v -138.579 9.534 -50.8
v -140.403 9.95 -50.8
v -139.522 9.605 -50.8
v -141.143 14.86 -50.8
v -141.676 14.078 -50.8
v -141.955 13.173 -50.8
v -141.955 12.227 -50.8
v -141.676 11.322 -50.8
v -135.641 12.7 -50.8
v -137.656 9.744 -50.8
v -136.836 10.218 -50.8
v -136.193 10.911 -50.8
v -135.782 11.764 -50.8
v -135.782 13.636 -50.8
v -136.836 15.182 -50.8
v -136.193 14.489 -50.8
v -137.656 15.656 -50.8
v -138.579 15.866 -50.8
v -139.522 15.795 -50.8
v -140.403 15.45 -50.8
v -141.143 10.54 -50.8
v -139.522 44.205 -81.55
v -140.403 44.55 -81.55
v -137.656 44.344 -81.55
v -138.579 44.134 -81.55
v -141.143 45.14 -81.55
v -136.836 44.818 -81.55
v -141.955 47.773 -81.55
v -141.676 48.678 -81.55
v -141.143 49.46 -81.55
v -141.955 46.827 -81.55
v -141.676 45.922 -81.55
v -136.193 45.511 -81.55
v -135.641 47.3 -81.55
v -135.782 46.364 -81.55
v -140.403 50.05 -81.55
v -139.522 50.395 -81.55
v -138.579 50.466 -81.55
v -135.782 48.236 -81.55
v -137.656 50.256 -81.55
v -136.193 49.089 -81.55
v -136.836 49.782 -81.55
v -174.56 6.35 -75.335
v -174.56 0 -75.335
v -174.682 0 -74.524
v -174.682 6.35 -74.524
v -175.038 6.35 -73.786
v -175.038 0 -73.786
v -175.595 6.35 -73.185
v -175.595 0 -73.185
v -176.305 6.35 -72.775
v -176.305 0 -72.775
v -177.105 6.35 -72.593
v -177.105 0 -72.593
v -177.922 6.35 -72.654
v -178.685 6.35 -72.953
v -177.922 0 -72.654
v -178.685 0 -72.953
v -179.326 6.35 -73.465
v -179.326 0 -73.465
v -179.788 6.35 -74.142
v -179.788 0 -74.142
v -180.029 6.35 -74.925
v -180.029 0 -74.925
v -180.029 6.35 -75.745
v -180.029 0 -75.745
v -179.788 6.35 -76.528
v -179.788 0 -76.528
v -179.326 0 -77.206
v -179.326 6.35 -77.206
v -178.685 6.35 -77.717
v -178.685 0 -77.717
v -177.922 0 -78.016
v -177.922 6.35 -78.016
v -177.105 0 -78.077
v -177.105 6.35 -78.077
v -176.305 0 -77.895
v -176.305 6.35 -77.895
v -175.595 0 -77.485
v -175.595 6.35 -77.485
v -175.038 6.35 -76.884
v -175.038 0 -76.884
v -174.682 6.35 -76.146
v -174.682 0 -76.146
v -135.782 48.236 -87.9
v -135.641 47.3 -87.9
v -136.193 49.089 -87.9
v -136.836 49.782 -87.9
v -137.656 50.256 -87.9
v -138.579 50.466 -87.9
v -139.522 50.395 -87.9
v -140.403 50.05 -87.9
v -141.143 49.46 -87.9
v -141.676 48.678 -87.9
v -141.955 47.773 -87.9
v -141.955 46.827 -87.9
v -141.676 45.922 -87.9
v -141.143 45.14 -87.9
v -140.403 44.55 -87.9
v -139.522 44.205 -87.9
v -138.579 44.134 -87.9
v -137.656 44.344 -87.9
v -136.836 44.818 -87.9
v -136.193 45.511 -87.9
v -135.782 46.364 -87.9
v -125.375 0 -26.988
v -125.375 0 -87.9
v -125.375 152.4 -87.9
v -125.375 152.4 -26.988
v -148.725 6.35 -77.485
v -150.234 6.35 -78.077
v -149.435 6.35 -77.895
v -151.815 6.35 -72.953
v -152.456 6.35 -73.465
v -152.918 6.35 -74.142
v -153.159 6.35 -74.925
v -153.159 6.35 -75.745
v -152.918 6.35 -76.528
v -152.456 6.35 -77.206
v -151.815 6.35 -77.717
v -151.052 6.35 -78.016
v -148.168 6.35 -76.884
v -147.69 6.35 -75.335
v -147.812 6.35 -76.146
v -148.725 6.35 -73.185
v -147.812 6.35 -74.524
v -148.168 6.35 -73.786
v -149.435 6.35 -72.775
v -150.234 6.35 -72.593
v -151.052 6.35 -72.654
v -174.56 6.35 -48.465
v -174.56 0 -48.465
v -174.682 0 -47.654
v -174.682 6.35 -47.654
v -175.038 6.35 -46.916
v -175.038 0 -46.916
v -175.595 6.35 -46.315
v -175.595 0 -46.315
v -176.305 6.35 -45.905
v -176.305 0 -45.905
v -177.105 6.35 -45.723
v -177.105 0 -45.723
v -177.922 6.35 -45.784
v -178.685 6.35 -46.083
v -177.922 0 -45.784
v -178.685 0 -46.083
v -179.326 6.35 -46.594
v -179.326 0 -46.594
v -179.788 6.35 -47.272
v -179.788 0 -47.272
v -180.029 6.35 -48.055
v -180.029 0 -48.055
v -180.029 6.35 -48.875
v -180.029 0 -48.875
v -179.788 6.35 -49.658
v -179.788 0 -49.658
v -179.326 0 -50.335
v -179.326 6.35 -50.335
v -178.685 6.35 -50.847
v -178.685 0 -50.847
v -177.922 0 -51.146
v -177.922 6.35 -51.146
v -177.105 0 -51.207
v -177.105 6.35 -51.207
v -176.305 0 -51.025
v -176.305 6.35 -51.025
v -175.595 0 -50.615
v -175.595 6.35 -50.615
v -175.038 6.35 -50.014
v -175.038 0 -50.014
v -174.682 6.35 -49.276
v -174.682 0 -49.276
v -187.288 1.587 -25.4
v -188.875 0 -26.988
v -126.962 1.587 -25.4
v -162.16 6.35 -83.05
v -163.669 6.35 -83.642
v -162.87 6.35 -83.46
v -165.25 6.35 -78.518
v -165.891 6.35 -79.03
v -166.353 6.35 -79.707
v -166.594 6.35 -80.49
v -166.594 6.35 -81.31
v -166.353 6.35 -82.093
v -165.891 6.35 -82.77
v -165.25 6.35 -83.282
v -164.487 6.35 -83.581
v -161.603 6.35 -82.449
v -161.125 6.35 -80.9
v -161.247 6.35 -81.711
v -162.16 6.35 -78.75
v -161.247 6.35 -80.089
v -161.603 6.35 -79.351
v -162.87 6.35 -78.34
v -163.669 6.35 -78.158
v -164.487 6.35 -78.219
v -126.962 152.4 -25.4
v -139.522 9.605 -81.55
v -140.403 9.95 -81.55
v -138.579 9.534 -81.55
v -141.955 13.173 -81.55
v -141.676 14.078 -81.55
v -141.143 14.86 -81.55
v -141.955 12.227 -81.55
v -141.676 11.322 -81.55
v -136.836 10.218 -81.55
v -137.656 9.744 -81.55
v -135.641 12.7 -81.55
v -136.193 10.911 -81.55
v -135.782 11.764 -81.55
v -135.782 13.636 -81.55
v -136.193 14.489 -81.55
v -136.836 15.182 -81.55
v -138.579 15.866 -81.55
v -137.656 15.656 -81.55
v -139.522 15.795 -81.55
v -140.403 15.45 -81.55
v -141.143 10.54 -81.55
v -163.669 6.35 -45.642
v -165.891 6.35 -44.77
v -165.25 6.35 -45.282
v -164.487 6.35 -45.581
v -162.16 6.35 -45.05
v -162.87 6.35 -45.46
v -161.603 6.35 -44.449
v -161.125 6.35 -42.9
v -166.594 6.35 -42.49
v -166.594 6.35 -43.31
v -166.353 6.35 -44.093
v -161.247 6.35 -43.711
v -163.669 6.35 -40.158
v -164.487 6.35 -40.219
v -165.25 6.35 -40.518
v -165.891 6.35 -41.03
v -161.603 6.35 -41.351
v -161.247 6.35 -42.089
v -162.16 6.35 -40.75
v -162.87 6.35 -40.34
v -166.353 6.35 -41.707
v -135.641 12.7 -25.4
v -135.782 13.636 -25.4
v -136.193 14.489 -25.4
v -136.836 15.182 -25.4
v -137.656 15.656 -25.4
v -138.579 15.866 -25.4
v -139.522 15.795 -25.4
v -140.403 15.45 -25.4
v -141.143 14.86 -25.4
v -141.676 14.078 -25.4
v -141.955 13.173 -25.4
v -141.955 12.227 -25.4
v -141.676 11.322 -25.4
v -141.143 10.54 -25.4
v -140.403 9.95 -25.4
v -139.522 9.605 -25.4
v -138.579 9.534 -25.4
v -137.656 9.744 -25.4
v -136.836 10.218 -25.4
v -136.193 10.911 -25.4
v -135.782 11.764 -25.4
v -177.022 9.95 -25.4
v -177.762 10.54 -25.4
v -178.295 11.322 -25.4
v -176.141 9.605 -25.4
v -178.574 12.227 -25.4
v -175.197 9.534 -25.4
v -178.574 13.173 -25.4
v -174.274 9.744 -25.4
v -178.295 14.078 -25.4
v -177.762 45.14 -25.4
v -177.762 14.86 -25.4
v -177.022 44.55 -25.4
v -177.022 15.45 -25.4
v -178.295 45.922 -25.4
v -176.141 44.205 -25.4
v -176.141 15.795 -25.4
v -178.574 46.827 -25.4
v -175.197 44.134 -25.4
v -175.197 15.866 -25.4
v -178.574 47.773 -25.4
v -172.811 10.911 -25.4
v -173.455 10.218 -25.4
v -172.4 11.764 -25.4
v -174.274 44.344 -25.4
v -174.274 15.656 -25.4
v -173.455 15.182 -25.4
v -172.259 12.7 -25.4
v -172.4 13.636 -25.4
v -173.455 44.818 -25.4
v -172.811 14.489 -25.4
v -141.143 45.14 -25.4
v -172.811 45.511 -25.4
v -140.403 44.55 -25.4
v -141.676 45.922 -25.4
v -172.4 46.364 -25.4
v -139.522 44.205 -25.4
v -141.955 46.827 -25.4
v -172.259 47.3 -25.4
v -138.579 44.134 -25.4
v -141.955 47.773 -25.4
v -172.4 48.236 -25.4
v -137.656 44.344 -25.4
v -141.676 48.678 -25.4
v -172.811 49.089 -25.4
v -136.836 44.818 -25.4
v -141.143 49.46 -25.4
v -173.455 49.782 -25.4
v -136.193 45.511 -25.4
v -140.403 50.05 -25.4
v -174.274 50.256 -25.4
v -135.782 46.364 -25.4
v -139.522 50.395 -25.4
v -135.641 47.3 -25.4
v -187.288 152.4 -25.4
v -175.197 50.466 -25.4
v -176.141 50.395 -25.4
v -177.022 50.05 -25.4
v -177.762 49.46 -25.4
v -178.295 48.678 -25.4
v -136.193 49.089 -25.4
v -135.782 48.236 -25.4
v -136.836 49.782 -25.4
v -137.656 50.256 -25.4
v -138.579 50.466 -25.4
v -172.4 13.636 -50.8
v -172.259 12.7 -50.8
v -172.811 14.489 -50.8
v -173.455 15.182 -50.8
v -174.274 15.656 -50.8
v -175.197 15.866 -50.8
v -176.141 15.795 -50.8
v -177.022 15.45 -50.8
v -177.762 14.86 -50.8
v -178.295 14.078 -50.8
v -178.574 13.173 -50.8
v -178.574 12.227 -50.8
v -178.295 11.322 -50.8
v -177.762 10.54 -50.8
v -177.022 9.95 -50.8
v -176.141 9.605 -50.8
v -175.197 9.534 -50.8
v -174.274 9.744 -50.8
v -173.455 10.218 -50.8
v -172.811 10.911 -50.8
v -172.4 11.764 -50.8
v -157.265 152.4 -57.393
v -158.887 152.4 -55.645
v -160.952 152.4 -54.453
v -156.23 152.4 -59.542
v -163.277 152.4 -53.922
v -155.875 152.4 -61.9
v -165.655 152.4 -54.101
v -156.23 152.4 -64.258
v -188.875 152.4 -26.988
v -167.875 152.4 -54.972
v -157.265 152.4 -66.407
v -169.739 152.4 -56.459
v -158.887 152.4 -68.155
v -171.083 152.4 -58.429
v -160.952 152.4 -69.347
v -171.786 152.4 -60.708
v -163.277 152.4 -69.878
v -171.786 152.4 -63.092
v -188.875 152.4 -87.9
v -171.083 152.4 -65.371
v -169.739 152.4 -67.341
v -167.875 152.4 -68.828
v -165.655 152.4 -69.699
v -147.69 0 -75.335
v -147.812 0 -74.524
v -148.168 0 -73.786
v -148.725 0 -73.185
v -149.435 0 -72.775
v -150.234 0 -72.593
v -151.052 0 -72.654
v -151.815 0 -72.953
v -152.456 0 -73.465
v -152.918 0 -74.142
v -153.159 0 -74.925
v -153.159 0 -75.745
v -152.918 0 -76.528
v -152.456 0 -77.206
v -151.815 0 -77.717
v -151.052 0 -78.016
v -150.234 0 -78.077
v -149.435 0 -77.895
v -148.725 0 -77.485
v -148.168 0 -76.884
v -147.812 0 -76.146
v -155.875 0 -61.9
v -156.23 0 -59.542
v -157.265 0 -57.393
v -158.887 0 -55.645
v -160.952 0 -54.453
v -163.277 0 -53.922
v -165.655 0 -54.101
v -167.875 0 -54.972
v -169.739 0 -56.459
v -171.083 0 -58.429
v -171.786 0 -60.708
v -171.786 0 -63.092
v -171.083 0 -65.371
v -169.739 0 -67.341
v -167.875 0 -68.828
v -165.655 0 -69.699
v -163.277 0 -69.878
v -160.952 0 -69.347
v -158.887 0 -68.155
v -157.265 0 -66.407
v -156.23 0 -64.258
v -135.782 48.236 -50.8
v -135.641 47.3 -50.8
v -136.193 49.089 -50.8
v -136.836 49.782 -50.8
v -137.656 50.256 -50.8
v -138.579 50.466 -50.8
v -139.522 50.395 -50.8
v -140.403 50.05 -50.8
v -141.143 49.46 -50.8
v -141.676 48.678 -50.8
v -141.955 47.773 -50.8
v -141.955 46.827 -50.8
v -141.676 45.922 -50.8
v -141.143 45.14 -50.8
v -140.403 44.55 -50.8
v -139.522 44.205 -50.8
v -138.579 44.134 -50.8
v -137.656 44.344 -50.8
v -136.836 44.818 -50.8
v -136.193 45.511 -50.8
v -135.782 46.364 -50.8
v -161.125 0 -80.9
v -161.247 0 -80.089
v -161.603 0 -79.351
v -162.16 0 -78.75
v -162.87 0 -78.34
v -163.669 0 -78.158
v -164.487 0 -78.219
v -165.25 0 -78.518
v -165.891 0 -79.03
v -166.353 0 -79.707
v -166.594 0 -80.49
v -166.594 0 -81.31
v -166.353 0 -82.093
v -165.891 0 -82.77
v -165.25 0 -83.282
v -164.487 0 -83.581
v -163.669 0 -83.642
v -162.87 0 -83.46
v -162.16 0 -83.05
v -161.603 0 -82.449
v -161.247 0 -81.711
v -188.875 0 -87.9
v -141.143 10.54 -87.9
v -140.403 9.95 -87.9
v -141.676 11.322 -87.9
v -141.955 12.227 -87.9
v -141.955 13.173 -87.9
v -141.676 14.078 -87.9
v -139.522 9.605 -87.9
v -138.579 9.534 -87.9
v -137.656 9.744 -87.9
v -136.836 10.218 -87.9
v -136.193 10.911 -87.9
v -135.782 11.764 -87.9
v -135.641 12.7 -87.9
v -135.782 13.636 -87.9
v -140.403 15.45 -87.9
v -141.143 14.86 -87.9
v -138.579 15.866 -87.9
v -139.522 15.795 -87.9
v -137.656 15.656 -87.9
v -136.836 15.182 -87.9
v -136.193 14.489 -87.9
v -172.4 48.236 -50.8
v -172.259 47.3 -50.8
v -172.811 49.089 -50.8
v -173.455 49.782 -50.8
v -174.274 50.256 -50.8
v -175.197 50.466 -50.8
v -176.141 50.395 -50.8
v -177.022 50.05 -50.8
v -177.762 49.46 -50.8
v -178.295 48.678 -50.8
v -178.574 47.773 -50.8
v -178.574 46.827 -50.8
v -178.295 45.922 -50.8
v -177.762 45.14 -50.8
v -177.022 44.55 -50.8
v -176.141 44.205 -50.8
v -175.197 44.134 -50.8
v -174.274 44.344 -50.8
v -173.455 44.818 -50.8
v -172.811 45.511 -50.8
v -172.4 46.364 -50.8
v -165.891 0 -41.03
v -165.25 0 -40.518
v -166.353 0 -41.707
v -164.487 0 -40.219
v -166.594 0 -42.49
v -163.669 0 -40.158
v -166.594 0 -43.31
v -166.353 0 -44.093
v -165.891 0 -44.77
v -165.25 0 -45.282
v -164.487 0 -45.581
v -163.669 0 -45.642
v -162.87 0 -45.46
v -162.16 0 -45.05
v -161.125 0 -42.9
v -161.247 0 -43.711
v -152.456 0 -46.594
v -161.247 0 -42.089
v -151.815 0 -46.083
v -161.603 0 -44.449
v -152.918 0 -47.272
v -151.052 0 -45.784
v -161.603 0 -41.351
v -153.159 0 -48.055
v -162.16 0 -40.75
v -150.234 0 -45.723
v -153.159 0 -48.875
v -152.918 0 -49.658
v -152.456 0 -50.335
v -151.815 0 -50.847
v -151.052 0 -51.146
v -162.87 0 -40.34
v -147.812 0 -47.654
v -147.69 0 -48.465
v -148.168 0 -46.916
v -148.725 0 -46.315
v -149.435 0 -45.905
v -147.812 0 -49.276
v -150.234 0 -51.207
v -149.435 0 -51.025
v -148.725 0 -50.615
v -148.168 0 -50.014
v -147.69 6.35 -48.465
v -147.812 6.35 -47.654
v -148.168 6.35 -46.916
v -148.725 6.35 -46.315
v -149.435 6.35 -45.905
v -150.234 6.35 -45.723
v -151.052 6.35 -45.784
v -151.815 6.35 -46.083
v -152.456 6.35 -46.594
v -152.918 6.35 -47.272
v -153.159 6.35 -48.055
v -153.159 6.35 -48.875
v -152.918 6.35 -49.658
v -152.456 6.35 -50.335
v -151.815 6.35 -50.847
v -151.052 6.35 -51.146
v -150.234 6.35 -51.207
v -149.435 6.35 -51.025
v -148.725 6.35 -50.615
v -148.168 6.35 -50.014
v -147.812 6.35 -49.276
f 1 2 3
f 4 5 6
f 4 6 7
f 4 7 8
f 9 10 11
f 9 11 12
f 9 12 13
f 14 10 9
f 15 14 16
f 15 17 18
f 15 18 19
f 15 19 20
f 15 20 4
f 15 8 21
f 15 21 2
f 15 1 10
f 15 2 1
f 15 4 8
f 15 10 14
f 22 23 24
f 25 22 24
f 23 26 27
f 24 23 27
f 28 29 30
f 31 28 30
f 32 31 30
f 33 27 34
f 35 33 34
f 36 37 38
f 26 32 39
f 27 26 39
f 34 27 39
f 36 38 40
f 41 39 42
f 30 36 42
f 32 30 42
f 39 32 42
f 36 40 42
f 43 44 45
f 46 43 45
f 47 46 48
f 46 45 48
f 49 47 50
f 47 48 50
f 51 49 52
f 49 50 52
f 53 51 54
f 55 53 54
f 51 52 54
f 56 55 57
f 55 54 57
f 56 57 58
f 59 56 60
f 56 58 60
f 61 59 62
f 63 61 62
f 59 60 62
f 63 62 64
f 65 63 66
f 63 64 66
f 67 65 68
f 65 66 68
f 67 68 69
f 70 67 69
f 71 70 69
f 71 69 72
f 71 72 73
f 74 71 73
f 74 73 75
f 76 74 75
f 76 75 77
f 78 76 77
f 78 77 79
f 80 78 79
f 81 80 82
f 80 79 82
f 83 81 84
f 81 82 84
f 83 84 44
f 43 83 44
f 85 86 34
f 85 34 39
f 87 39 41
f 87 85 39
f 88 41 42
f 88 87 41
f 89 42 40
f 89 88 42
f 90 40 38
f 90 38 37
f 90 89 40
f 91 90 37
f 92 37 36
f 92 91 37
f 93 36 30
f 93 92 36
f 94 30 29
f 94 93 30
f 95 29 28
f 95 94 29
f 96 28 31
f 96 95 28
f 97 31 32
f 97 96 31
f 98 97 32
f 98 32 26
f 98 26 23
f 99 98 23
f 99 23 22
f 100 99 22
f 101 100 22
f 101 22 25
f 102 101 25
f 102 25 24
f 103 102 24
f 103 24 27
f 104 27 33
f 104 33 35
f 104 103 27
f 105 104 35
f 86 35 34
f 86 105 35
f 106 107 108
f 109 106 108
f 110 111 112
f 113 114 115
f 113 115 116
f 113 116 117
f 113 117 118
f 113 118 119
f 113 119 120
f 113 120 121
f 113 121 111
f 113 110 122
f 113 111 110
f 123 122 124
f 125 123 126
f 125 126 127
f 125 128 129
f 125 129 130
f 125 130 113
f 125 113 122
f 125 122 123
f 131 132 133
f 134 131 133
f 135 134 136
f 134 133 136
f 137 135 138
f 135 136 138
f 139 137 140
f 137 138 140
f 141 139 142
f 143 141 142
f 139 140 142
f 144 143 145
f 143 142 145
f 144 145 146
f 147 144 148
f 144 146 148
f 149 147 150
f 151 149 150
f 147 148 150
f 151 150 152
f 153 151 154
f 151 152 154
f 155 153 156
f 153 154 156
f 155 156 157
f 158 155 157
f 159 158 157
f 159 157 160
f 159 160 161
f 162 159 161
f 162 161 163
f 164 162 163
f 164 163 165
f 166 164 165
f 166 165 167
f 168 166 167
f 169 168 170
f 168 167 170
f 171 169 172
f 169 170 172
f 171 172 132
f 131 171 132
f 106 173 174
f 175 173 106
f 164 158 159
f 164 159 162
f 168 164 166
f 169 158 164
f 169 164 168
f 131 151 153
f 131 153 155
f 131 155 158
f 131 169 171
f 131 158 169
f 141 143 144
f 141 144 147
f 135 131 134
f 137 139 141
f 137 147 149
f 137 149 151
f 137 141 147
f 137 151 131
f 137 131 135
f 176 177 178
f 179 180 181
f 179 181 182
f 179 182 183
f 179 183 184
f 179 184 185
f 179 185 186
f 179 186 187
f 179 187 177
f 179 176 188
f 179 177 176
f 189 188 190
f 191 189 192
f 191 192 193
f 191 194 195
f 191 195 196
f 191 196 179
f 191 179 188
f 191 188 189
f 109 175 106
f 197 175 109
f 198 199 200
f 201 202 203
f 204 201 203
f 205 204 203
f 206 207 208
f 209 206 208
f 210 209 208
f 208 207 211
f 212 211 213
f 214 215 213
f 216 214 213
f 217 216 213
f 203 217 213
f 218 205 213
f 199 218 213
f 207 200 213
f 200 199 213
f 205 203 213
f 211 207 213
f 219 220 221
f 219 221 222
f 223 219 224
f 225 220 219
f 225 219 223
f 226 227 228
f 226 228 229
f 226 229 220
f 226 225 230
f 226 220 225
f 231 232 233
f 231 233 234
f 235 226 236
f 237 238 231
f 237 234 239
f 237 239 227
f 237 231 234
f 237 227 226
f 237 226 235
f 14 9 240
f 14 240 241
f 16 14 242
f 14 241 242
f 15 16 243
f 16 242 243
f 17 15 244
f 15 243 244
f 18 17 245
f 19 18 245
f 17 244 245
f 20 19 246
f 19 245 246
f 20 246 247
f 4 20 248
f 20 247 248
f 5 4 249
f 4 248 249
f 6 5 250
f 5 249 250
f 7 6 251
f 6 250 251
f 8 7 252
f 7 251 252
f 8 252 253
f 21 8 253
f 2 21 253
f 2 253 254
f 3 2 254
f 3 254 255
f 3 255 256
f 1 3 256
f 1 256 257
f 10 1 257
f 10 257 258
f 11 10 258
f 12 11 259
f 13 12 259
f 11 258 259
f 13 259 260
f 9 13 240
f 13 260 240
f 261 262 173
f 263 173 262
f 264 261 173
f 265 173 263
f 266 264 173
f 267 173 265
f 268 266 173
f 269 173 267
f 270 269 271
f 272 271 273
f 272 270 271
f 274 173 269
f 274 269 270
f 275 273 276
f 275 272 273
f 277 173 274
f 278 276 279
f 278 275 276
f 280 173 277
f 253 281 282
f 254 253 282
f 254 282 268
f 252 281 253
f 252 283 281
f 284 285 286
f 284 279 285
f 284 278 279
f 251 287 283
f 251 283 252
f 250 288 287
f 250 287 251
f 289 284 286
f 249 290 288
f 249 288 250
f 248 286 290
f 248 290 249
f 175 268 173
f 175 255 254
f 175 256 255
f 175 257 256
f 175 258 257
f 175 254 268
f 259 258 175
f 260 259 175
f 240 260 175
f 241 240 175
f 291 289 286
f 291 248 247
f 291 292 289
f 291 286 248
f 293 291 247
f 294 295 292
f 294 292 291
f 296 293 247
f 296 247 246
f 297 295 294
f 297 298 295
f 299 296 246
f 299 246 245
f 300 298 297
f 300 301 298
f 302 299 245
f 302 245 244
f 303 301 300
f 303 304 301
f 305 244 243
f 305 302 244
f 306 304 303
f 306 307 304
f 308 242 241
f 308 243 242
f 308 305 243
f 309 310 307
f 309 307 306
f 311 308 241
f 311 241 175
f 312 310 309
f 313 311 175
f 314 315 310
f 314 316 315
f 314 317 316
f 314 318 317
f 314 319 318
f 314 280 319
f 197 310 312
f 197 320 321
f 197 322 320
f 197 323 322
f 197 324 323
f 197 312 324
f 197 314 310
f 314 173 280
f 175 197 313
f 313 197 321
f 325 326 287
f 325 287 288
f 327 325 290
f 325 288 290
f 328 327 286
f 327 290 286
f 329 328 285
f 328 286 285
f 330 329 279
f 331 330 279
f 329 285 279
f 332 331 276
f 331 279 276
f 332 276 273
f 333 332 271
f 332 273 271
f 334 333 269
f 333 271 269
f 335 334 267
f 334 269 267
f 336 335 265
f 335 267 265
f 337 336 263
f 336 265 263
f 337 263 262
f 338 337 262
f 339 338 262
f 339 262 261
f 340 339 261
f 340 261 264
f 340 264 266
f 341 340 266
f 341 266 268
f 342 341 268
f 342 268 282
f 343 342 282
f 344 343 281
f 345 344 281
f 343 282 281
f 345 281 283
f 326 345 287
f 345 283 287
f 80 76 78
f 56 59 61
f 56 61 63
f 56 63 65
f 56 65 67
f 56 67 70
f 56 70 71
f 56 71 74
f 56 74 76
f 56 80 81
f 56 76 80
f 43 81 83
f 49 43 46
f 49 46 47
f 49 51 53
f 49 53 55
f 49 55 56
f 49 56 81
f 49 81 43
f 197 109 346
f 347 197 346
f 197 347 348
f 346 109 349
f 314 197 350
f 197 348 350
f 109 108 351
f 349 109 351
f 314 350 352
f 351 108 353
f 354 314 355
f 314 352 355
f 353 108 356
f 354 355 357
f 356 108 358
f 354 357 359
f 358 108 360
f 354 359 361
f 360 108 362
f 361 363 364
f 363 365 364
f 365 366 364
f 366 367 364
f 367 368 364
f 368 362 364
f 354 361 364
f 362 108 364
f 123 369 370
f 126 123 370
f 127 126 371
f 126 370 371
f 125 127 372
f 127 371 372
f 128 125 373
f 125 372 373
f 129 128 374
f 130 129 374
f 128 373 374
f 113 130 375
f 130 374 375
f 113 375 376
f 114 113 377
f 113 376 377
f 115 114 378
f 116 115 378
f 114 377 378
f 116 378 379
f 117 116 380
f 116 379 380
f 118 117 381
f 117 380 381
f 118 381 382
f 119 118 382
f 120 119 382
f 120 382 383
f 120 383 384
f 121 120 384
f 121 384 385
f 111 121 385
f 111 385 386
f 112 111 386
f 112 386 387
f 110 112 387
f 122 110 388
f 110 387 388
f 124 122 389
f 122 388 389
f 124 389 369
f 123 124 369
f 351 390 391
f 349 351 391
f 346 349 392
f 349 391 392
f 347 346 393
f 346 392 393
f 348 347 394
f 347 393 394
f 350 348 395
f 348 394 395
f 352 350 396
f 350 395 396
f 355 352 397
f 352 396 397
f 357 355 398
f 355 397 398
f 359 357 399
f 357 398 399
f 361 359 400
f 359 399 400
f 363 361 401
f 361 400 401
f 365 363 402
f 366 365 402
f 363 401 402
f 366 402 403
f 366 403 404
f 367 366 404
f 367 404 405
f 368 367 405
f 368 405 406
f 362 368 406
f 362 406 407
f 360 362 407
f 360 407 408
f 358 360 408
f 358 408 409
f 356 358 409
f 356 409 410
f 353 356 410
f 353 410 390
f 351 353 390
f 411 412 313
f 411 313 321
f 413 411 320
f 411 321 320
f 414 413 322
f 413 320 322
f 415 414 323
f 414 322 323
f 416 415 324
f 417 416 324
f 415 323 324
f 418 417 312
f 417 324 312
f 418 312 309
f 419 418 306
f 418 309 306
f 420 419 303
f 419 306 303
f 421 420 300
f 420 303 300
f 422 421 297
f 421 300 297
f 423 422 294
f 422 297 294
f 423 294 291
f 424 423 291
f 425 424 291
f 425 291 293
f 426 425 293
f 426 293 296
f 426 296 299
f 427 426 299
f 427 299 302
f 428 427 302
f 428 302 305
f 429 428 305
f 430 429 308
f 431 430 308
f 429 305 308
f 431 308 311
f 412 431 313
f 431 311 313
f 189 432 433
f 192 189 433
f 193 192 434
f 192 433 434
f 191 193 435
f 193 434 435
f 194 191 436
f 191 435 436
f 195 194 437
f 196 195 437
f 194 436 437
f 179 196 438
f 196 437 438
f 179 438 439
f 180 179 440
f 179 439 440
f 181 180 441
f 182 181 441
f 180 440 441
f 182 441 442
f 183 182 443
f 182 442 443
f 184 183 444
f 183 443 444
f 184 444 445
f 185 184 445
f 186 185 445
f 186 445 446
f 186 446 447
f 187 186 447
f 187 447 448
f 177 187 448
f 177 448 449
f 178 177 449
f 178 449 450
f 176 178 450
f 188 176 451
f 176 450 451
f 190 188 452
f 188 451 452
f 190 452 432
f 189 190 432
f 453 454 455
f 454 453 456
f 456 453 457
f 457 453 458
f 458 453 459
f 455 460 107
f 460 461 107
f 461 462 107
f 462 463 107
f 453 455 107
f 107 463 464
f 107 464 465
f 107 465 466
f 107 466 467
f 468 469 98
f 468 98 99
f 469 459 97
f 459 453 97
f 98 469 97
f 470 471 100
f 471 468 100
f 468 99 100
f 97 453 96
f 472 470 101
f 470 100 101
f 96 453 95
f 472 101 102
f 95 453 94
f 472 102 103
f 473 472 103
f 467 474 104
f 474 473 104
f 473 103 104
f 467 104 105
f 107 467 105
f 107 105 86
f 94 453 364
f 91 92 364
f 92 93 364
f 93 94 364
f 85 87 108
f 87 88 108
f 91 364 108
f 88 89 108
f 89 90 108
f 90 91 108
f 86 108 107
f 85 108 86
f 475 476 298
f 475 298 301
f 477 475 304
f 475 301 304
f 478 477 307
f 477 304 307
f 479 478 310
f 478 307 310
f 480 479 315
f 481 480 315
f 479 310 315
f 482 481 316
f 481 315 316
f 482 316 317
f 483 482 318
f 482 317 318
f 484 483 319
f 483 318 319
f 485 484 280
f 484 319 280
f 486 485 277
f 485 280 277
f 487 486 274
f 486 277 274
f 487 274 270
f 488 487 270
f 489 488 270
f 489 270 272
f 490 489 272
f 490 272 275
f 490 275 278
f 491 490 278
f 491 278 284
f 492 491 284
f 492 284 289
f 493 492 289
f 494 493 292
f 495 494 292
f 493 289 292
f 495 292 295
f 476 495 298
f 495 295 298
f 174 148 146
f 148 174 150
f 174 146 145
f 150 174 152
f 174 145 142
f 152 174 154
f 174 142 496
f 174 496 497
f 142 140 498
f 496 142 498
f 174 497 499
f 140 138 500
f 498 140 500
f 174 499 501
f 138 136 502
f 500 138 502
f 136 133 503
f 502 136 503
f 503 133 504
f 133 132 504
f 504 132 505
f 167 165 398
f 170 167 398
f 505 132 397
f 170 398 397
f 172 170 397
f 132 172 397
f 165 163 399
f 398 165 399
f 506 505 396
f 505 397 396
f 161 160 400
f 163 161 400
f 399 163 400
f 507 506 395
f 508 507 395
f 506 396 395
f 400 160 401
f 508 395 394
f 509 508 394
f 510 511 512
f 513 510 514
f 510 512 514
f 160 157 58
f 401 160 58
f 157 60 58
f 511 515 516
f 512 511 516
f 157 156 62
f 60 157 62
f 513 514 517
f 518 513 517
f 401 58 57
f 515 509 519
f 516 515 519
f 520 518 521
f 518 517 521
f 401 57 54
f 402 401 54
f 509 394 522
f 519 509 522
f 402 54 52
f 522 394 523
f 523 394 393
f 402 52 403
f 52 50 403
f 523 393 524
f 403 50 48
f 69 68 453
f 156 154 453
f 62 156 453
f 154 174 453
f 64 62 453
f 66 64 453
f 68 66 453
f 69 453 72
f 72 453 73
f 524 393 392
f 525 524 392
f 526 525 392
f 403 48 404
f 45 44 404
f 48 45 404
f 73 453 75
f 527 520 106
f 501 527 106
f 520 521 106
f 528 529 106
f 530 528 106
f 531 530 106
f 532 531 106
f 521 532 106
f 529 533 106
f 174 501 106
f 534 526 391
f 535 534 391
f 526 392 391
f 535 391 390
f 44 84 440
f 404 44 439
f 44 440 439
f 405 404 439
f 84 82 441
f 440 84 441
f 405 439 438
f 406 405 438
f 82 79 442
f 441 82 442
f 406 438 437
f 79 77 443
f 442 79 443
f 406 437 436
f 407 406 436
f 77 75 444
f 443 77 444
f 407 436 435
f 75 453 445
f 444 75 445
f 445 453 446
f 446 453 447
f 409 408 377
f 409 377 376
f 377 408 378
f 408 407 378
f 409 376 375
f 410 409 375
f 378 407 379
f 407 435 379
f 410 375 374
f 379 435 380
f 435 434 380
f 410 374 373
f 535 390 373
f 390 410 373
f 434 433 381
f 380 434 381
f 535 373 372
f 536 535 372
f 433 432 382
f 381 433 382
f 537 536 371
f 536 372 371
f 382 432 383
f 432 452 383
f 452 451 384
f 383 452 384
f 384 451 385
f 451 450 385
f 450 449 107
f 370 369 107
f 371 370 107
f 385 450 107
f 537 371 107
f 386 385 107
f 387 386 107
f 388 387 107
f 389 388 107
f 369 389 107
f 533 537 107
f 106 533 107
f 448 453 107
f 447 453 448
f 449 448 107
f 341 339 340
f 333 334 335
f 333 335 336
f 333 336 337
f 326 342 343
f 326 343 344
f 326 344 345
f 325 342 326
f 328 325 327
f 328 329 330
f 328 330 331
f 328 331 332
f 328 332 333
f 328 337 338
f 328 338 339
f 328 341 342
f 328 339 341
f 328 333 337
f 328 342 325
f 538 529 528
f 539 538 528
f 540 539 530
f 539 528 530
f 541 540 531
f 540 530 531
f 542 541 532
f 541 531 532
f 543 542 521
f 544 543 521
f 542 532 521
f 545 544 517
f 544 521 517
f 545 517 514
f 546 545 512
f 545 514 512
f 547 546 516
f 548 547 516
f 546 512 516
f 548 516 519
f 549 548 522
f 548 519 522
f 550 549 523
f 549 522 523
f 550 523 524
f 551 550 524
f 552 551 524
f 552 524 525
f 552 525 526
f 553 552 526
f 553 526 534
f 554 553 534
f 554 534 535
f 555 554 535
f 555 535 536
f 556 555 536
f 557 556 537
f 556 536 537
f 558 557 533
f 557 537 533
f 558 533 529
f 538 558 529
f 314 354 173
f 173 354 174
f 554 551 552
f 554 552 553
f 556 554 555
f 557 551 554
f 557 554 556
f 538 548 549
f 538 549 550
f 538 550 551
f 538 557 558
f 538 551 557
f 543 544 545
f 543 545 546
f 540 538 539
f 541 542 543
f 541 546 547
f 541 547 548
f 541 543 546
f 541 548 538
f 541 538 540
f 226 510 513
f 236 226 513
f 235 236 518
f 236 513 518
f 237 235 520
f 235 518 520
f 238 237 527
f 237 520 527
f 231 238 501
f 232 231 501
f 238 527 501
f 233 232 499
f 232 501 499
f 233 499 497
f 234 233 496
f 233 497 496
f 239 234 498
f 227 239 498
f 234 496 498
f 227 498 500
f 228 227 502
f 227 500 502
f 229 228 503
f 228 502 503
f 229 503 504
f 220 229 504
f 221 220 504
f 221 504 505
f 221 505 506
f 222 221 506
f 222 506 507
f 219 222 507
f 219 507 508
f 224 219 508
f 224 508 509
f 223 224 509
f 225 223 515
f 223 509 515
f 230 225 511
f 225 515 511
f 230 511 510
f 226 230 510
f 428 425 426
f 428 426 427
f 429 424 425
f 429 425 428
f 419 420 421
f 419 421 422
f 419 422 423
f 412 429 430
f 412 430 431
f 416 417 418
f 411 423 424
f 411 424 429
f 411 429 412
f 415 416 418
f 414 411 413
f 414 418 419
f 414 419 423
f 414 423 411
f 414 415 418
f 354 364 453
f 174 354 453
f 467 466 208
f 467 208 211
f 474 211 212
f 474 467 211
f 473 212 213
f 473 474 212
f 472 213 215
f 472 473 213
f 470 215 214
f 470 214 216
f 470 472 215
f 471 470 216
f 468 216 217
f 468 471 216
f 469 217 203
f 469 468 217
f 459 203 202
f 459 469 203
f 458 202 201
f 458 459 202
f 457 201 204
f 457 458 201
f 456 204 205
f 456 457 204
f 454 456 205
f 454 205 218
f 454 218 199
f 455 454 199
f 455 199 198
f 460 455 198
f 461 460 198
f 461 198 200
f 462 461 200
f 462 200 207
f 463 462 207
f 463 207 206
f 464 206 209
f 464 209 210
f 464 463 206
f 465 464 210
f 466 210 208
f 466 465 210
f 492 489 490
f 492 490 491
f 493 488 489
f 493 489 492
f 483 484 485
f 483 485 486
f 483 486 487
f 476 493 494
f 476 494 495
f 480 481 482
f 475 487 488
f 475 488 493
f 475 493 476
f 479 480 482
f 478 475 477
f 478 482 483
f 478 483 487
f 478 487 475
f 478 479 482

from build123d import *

# Parameters (mm, degrees)
PRIMARY_START           = -87.9
SKETCH2_W               = 20.25
SKETCH2_H               = 60
SKETCH2_W_2             = 43.25
PRIMARY_EXTRUSION_DEPTH = 62.5
SKETCH3_R               = 3.175
CUT_EXTRUDE2_DEPTH      = 25.4
CUT_EXTRUDE3_START      = -62.5
SKETCH3_2_R             = 3.175
CUT_EXTRUDE3_DEPTH      = 6.35
CHAMFER1_SIZE           = 1.5875
CUT_EXTRUDE4_DEPTH      = 6.35
CUT_EXTRUDE5_DEPTH      = 153.4


with BuildPart() as part:
    # Sketch2 → Primary Extrusion (new body)
    with BuildSketch(Plane.XY.offset(PRIMARY_START)):
        with Locations((-135.5, 30)):
            Rectangle(SKETCH2_W, SKETCH2_H)
        with BuildLine():
            ThreePointArc((-132.325, 7), (-135.625, 3.7), (-138.925, 7))
            ThreePointArc((-138.925, 7), (-135.625, 10.3), (-132.325, 7))
        make_face(mode=Mode.SUBTRACT)
        with BuildLine():
            ThreePointArc((-132.325, 53), (-135.625, 49.7), (-138.925, 53))
            ThreePointArc((-138.925, 53), (-135.625, 56.3), (-132.325, 53))
        make_face(mode=Mode.SUBTRACT)
        with BuildLine():
            ThreePointArc((-138.925, 7), (-135.625, 3.7), (-132.325, 7))
            ThreePointArc((-132.325, 7), (-135.625, 10.3), (-138.925, 7))
        make_face()
        with BuildLine():
            ThreePointArc((-138.925, 53), (-135.625, 49.7), (-132.325, 53))
            ThreePointArc((-132.325, 53), (-135.625, 56.3), (-138.925, 53))
        make_face()
        with Locations((-167.25, 30)):
            Rectangle(SKETCH2_W_2, SKETCH2_H)
        Polygon((-145.625, 60), (-125.375, 60), (-125.375, 152.4), (-188.875, 152.4), (-188.875, 60), align=None)
    extrude(amount=PRIMARY_EXTRUSION_DEPTH)

    # Sketch3 → Cut-Extrude2 (cut)
    with BuildSketch(Plane.XY.offset(-25.4)):
        with Locations((-138.815833333, 47.3)):
            Circle(SKETCH3_R)
        with Locations((-138.815833333, 12.7)):
            Circle(SKETCH3_R)
        with Locations((93.595, 47.3)):
            Circle(SKETCH3_R)
        with Locations((131.655, 47.3)):
            Circle(SKETCH3_R)
        with Locations((131.655, 12.7)):
            Circle(SKETCH3_R)
        with Locations((93.595, 12.7)):
            Circle(SKETCH3_R)
        with Locations((-175.434166667, 47.3)):
            Circle(SKETCH3_R)
        with Locations((-175.434166667, 12.7)):
            Circle(SKETCH3_R)
    extrude(amount=-CUT_EXTRUDE2_DEPTH, mode=Mode.SUBTRACT)

    # Sketch3<2> → Cut-Extrude3 (cut)
    with BuildSketch(Plane.XY.offset(-25.4).offset(CUT_EXTRUDE3_START)):
        with Locations((-138.815833333, 47.3)):
            Circle(SKETCH3_2_R)
        with Locations((-138.815833333, 12.7)):
            Circle(SKETCH3_2_R)
    extrude(amount=CUT_EXTRUDE3_DEPTH, mode=Mode.SUBTRACT)

    # Chamfer1
    chamfer1_edges = [part.edges().sort_by_distance(p)[0] for p in [
        (-157.125, 0, -25.4),
        (-125.375, 76.2, -25.4),
        (-188.875, 76.2, -25.4),
    ]]
    chamfer(chamfer1_edges, length=CHAMFER1_SIZE)

    # Sketch4 → Cut-Extrude4 (cut)
    with BuildSketch(Plane.XZ):
        with BuildLine():
            ThreePointArc((-153.189971157, -75.335028843), (-150.439971157, -78.085028843), (-147.689971157, -75.335028843))
            ThreePointArc((-147.689971157, -75.335028843), (-150.439971157, -72.585028843), (-153.189971157, -75.335028843))
        make_face()
        with BuildLine():
            ThreePointArc((-166.625, -80.9), (-163.875, -83.65), (-161.125, -80.9))
            ThreePointArc((-161.125, -80.9), (-163.875, -78.15), (-166.625, -80.9))
        make_face()
        with BuildLine():
            ThreePointArc((-180.060028843, -75.335028843), (-177.310028843, -78.085028843), (-174.560028843, -75.335028843))
            ThreePointArc((-174.560028843, -75.335028843), (-177.310028843, -72.585028843), (-180.060028843, -75.335028843))
        make_face()
        with BuildLine():
            ThreePointArc((-153.189971157, -48.464971157), (-150.439971157, -51.214971157), (-147.689971157, -48.464971157))
            ThreePointArc((-147.689971157, -48.464971157), (-150.439971157, -45.714971157), (-153.189971157, -48.464971157))
        make_face()
        with BuildLine():
            ThreePointArc((-166.625, -42.9), (-163.875, -45.65), (-161.125, -42.9))
            ThreePointArc((-161.125, -42.9), (-163.875, -40.15), (-166.625, -42.9))
        make_face()
        with BuildLine():
            ThreePointArc((-180.060028843, -48.464971157), (-177.310028843, -51.214971157), (-174.560028843, -48.464971157))
            ThreePointArc((-174.560028843, -48.464971157), (-177.310028843, -45.714971157), (-180.060028843, -48.464971157))
        make_face()
    extrude(amount=-CUT_EXTRUDE4_DEPTH, mode=Mode.SUBTRACT)

    # Sketch4<4> → Cut-Extrude5 (cut, through all)
    with BuildSketch(Plane.XZ):
        with BuildLine():
            ThreePointArc((-171.875, -61.9), (-163.875, -69.9), (-155.875, -61.9))
            ThreePointArc((-155.875, -61.9), (-163.875, -53.9), (-171.875, -61.9))
        make_face()
    extrude(amount=-CUT_EXTRUDE5_DEPTH, mode=Mode.SUBTRACT)


solid = part.part
